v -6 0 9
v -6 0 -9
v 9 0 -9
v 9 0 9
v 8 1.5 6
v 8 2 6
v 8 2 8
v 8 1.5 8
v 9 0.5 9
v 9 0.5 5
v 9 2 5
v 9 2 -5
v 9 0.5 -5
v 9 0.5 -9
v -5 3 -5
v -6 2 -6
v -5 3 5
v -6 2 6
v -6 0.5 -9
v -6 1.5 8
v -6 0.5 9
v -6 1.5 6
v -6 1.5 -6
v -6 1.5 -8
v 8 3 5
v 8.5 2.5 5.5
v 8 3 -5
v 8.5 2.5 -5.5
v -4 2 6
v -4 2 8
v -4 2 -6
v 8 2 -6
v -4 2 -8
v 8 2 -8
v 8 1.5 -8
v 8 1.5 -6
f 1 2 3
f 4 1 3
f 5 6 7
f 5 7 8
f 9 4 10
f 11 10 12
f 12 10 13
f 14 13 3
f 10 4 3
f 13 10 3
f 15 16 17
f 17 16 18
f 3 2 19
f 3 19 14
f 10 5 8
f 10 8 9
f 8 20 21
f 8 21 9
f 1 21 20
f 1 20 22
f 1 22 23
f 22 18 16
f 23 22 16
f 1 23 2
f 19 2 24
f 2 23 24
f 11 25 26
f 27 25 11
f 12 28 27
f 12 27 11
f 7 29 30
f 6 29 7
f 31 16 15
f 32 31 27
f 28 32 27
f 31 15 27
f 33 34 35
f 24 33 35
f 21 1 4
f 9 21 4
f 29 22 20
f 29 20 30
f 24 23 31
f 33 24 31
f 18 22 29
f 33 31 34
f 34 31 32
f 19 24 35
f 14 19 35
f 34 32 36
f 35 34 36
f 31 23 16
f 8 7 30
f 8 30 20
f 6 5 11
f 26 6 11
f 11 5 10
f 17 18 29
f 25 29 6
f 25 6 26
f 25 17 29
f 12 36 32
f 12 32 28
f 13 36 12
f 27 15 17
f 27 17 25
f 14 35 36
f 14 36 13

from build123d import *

# Parameters (mm, degrees)
SKETCH_1_W          = 18
SKETCH_1_H          = 18
EXTRUDE_1_DEPTH     = 1.5
CHAMFER_1_SIZE      = 1
SKETCH_2_W          = 18
SKETCH_2_H          = 12
EXTRUDE_2_DEPTH     = 1.5
CHAMFER_2_SIZE      = 1
CHAMFER_3_SIZE      = 1
CUT_EXTRUDE_2_DEPTH = 3
CHAMFER_5_SIZE      = 1
CUT_EXTRUDE_5_DEPTH = 3
EXTRUDE_12_DEPTH    = 2
EXTRUDE_13_DEPTH    = 2


with BuildPart() as part:
    # 草图1 → 凸台-拉伸1 (new body)
    with BuildSketch(Plane(origin=(0, 0, 0), x_dir=(1, 0, 0), z_dir=(0, 1, 0))):
        Rectangle(SKETCH_1_W, SKETCH_1_H)
    extrude(amount=EXTRUDE_1_DEPTH)

    # 倒角1
    chamfer_1_edges = [part.edges().sort_by_distance(p)[0] for p in [
        (0, 1.5, 9),
        (0, 1.5, -9),
    ]]
    chamfer(chamfer_1_edges, length=CHAMFER_1_SIZE)

    # 草图2 → 凸台-拉伸2 (add)
    with BuildSketch(Plane(origin=(0, 1.5, 0), x_dir=(1, 0, 0), z_dir=(0, 1, 0))):
        Rectangle(SKETCH_2_W, SKETCH_2_H)
    extrude(amount=EXTRUDE_2_DEPTH)

    # 倒角2
    chamfer_2_edges = [part.edges().sort_by_distance(p)[0] for p in [
        (0, 3, 6),
        (0, 3, -6),
    ]]
    chamfer(chamfer_2_edges, length=CHAMFER_2_SIZE)

    # 倒角3
    # the kernel refuses this chamfer: 1 mm, written as the material it takes off along each edge
    with BuildSketch(Plane(origin=(9, 1.5, 6), x_dir=(-0.9996219169112968, 0, 0.027495876610586487), z_dir=(0, 1, 0))) as chamfer_3_piece_1:
        Polygon((CHAMFER_3_SIZE * 0.999621916911, -CHAMFER_3_SIZE * 0.0274958766106), (-CHAMFER_3_SIZE * 0.0274958766106, -CHAMFER_3_SIZE * 0.999621916911), (0, 0), align=None)
    extrude(amount=3.071682988, mode=Mode.SUBTRACT)
    with BuildSketch(Plane(origin=(9, 1.5, 10.571682988), x_dir=(-0.9996219169112968, 0.02749587661058627, 0), z_dir=(0, 0, -1)), Plane(origin=(9, 1.5, -6), x_dir=(-0.9996219169112968, 0.02749587661058627, 0), z_dir=(0, 0, -1))) as chamfer_3_piece_2:
        Polygon((CHAMFER_3_SIZE * 0.999621916911, -CHAMFER_3_SIZE * 0.0274958766106), (-CHAMFER_3_SIZE * 0.0274958766106, -CHAMFER_3_SIZE * 0.999621916911), (0, 0), align=None)
    extrude(amount=4.571682988, mode=Mode.SUBTRACT)
    with BuildSketch(Plane(origin=(9, 1.5, -6), x_dir=(-0.9996219169112968, 0, -0.027495876610586535), z_dir=(0, 1, 0))) as chamfer_3_piece_3:
        Polygon((CHAMFER_3_SIZE * 0.999621916911, CHAMFER_3_SIZE * 0.0274958766106), (-CHAMFER_3_SIZE * 0.0274958766106, CHAMFER_3_SIZE * 0.999621916911), (0, 0), align=None)
    extrude(amount=3.071682988, mode=Mode.SUBTRACT)
    with BuildSketch(Plane(origin=(9, 3, -7.571682988), x_dir=(-0.9996219169112968, 0.027495876610586487, 0), z_dir=(0, 0, 1))) as chamfer_3_piece_4:
        Polygon((CHAMFER_3_SIZE * 0.999621916911, CHAMFER_3_SIZE * 0.0274958766106), (-CHAMFER_3_SIZE * 0.0274958766106, CHAMFER_3_SIZE * 0.999621916911), (0, 0), align=None)
    extrude(amount=15.143365976, mode=Mode.SUBTRACT)
    with BuildSketch(Plane(origin=(9, -1.071682988, 6), x_dir=(-0.9996219169112968, 0, 0.027495876610586487), z_dir=(0, 1, 0))) as chamfer_3_piece_5a_section:
        Polygon((CHAMFER_3_SIZE * 0.999621916911, -CHAMFER_3_SIZE * 0.0274958766106), (-CHAMFER_3_SIZE * 0.0274958766106, -CHAMFER_3_SIZE * 0.999621916911), (0, 0), align=None)
    chamfer_3_piece_5a = extrude(amount=5.643365976, mode=Mode.PRIVATE)
    chamfer_3_piece_5a = split(chamfer_3_piece_5a, bisect_by=Plane(origin=(8.670206373, 1.5, 5.670206373), z_dir=(0, -1, 0)), keep=Keep.TOP, mode=Mode.PRIVATE)
    with BuildSketch(Plane(origin=(9, 1.5, 10.571682988), x_dir=(-0.9996219169112968, 0.02749587661058627, 0), z_dir=(0, 0, -1))) as chamfer_3_piece_5b_section:
        Polygon((CHAMFER_3_SIZE * 0.999621916911, -CHAMFER_3_SIZE * 0.0274958766106), (-CHAMFER_3_SIZE * 0.0274958766106, -CHAMFER_3_SIZE * 0.999621916911), (0, 0), align=None)
    chamfer_3_piece_5b = extrude(amount=7.143365976, mode=Mode.PRIVATE)
    chamfer_3_piece_5b = split(chamfer_3_piece_5b, bisect_by=Plane(origin=(8.670206373, 1.170206373, 6), z_dir=(0, 0, -1)), keep=Keep.TOP, mode=Mode.PRIVATE)
    chamfer_3_piece_5 = chamfer_3_piece_5a & chamfer_3_piece_5b
    add(chamfer_3_piece_5, mode=Mode.SUBTRACT)
    with BuildSketch(Plane(origin=(9, -1.071682988, -6), x_dir=(-0.9996219169112968, 0, -0.027495876610586487), z_dir=(0, 1, 0))) as chamfer_3_piece_6a_section:
        Polygon((CHAMFER_3_SIZE * 0.999621916911, CHAMFER_3_SIZE * 0.0274958766106), (-CHAMFER_3_SIZE * 0.0274958766106, CHAMFER_3_SIZE * 0.999621916911), (0, 0), align=None)
    chamfer_3_piece_6a = extrude(amount=5.643365976, mode=Mode.PRIVATE)
    chamfer_3_piece_6a = split(chamfer_3_piece_6a, bisect_by=Plane(origin=(8.670206373, 1.5, -5.670206373), z_dir=(0, -1, 0)), keep=Keep.TOP, mode=Mode.PRIVATE)
    with BuildSketch(Plane(origin=(9, 1.5, -3.428317012), x_dir=(-0.9996219169112968, 0.02749587661058627, 0), z_dir=(0, 0, -1))) as chamfer_3_piece_6b_section:
        Polygon((CHAMFER_3_SIZE * 0.999621916911, -CHAMFER_3_SIZE * 0.0274958766106), (-CHAMFER_3_SIZE * 0.0274958766106, -CHAMFER_3_SIZE * 0.999621916911), (0, 0), align=None)
    chamfer_3_piece_6b = extrude(amount=7.143365976, mode=Mode.PRIVATE)
    chamfer_3_piece_6b = split(chamfer_3_piece_6b, bisect_by=Plane(origin=(8.670206373, 1.170206373, -6), z_dir=(0, 0, 1)), keep=Keep.TOP, mode=Mode.PRIVATE)
    chamfer_3_piece_6 = chamfer_3_piece_6a & chamfer_3_piece_6b
    add(chamfer_3_piece_6, mode=Mode.SUBTRACT)

    # 草图9 → 切除-拉伸2 (cut)
    with BuildSketch(Plane.ZY.offset(9)):
        Polygon((-6, 1.5), (-6, 2), (-5, 3), (5, 3), (6, 2), (6, 1.5), align=None)
    extrude(amount=-CUT_EXTRUDE_2_DEPTH, mode=Mode.SUBTRACT)

    # 倒角5
    chamfer_5_edges = [part.edges().sort_by_distance(p)[0] for p in [
        (-6, 3, 0),
    ]]
    chamfer(chamfer_5_edges, length=CHAMFER_5_SIZE)

    # 草图23 → 切除-拉伸5 (cut)
    with BuildSketch(Plane.ZY.offset(9)):
        Polygon((9, 0.5), (8, 1.5), (-8, 1.5), (-9, 0.5), (-9, 0), (9, 0), align=None)
    extrude(amount=-CUT_EXTRUDE_5_DEPTH, mode=Mode.SUBTRACT)

    # 草图24 → 凸台-拉伸12 (add)
    with BuildSketch(Plane(origin=(0, 0, -6), x_dir=(-1, 0, 0), z_dir=(0, 0, -1))):
        Polygon((6, 1.5), (4, 2), (-8, 2), (-8, 1.5), align=None)
    extrude(amount=EXTRUDE_12_DEPTH)

    # 草图25 → 凸台-拉伸13 (add)
    with BuildSketch(Plane.XY.offset(6)):
        Polygon((-6, 1.5), (-4, 2), (8, 2), (8, 1.5), align=None)
    extrude(amount=EXTRUDE_13_DEPTH)


solid = part.part
